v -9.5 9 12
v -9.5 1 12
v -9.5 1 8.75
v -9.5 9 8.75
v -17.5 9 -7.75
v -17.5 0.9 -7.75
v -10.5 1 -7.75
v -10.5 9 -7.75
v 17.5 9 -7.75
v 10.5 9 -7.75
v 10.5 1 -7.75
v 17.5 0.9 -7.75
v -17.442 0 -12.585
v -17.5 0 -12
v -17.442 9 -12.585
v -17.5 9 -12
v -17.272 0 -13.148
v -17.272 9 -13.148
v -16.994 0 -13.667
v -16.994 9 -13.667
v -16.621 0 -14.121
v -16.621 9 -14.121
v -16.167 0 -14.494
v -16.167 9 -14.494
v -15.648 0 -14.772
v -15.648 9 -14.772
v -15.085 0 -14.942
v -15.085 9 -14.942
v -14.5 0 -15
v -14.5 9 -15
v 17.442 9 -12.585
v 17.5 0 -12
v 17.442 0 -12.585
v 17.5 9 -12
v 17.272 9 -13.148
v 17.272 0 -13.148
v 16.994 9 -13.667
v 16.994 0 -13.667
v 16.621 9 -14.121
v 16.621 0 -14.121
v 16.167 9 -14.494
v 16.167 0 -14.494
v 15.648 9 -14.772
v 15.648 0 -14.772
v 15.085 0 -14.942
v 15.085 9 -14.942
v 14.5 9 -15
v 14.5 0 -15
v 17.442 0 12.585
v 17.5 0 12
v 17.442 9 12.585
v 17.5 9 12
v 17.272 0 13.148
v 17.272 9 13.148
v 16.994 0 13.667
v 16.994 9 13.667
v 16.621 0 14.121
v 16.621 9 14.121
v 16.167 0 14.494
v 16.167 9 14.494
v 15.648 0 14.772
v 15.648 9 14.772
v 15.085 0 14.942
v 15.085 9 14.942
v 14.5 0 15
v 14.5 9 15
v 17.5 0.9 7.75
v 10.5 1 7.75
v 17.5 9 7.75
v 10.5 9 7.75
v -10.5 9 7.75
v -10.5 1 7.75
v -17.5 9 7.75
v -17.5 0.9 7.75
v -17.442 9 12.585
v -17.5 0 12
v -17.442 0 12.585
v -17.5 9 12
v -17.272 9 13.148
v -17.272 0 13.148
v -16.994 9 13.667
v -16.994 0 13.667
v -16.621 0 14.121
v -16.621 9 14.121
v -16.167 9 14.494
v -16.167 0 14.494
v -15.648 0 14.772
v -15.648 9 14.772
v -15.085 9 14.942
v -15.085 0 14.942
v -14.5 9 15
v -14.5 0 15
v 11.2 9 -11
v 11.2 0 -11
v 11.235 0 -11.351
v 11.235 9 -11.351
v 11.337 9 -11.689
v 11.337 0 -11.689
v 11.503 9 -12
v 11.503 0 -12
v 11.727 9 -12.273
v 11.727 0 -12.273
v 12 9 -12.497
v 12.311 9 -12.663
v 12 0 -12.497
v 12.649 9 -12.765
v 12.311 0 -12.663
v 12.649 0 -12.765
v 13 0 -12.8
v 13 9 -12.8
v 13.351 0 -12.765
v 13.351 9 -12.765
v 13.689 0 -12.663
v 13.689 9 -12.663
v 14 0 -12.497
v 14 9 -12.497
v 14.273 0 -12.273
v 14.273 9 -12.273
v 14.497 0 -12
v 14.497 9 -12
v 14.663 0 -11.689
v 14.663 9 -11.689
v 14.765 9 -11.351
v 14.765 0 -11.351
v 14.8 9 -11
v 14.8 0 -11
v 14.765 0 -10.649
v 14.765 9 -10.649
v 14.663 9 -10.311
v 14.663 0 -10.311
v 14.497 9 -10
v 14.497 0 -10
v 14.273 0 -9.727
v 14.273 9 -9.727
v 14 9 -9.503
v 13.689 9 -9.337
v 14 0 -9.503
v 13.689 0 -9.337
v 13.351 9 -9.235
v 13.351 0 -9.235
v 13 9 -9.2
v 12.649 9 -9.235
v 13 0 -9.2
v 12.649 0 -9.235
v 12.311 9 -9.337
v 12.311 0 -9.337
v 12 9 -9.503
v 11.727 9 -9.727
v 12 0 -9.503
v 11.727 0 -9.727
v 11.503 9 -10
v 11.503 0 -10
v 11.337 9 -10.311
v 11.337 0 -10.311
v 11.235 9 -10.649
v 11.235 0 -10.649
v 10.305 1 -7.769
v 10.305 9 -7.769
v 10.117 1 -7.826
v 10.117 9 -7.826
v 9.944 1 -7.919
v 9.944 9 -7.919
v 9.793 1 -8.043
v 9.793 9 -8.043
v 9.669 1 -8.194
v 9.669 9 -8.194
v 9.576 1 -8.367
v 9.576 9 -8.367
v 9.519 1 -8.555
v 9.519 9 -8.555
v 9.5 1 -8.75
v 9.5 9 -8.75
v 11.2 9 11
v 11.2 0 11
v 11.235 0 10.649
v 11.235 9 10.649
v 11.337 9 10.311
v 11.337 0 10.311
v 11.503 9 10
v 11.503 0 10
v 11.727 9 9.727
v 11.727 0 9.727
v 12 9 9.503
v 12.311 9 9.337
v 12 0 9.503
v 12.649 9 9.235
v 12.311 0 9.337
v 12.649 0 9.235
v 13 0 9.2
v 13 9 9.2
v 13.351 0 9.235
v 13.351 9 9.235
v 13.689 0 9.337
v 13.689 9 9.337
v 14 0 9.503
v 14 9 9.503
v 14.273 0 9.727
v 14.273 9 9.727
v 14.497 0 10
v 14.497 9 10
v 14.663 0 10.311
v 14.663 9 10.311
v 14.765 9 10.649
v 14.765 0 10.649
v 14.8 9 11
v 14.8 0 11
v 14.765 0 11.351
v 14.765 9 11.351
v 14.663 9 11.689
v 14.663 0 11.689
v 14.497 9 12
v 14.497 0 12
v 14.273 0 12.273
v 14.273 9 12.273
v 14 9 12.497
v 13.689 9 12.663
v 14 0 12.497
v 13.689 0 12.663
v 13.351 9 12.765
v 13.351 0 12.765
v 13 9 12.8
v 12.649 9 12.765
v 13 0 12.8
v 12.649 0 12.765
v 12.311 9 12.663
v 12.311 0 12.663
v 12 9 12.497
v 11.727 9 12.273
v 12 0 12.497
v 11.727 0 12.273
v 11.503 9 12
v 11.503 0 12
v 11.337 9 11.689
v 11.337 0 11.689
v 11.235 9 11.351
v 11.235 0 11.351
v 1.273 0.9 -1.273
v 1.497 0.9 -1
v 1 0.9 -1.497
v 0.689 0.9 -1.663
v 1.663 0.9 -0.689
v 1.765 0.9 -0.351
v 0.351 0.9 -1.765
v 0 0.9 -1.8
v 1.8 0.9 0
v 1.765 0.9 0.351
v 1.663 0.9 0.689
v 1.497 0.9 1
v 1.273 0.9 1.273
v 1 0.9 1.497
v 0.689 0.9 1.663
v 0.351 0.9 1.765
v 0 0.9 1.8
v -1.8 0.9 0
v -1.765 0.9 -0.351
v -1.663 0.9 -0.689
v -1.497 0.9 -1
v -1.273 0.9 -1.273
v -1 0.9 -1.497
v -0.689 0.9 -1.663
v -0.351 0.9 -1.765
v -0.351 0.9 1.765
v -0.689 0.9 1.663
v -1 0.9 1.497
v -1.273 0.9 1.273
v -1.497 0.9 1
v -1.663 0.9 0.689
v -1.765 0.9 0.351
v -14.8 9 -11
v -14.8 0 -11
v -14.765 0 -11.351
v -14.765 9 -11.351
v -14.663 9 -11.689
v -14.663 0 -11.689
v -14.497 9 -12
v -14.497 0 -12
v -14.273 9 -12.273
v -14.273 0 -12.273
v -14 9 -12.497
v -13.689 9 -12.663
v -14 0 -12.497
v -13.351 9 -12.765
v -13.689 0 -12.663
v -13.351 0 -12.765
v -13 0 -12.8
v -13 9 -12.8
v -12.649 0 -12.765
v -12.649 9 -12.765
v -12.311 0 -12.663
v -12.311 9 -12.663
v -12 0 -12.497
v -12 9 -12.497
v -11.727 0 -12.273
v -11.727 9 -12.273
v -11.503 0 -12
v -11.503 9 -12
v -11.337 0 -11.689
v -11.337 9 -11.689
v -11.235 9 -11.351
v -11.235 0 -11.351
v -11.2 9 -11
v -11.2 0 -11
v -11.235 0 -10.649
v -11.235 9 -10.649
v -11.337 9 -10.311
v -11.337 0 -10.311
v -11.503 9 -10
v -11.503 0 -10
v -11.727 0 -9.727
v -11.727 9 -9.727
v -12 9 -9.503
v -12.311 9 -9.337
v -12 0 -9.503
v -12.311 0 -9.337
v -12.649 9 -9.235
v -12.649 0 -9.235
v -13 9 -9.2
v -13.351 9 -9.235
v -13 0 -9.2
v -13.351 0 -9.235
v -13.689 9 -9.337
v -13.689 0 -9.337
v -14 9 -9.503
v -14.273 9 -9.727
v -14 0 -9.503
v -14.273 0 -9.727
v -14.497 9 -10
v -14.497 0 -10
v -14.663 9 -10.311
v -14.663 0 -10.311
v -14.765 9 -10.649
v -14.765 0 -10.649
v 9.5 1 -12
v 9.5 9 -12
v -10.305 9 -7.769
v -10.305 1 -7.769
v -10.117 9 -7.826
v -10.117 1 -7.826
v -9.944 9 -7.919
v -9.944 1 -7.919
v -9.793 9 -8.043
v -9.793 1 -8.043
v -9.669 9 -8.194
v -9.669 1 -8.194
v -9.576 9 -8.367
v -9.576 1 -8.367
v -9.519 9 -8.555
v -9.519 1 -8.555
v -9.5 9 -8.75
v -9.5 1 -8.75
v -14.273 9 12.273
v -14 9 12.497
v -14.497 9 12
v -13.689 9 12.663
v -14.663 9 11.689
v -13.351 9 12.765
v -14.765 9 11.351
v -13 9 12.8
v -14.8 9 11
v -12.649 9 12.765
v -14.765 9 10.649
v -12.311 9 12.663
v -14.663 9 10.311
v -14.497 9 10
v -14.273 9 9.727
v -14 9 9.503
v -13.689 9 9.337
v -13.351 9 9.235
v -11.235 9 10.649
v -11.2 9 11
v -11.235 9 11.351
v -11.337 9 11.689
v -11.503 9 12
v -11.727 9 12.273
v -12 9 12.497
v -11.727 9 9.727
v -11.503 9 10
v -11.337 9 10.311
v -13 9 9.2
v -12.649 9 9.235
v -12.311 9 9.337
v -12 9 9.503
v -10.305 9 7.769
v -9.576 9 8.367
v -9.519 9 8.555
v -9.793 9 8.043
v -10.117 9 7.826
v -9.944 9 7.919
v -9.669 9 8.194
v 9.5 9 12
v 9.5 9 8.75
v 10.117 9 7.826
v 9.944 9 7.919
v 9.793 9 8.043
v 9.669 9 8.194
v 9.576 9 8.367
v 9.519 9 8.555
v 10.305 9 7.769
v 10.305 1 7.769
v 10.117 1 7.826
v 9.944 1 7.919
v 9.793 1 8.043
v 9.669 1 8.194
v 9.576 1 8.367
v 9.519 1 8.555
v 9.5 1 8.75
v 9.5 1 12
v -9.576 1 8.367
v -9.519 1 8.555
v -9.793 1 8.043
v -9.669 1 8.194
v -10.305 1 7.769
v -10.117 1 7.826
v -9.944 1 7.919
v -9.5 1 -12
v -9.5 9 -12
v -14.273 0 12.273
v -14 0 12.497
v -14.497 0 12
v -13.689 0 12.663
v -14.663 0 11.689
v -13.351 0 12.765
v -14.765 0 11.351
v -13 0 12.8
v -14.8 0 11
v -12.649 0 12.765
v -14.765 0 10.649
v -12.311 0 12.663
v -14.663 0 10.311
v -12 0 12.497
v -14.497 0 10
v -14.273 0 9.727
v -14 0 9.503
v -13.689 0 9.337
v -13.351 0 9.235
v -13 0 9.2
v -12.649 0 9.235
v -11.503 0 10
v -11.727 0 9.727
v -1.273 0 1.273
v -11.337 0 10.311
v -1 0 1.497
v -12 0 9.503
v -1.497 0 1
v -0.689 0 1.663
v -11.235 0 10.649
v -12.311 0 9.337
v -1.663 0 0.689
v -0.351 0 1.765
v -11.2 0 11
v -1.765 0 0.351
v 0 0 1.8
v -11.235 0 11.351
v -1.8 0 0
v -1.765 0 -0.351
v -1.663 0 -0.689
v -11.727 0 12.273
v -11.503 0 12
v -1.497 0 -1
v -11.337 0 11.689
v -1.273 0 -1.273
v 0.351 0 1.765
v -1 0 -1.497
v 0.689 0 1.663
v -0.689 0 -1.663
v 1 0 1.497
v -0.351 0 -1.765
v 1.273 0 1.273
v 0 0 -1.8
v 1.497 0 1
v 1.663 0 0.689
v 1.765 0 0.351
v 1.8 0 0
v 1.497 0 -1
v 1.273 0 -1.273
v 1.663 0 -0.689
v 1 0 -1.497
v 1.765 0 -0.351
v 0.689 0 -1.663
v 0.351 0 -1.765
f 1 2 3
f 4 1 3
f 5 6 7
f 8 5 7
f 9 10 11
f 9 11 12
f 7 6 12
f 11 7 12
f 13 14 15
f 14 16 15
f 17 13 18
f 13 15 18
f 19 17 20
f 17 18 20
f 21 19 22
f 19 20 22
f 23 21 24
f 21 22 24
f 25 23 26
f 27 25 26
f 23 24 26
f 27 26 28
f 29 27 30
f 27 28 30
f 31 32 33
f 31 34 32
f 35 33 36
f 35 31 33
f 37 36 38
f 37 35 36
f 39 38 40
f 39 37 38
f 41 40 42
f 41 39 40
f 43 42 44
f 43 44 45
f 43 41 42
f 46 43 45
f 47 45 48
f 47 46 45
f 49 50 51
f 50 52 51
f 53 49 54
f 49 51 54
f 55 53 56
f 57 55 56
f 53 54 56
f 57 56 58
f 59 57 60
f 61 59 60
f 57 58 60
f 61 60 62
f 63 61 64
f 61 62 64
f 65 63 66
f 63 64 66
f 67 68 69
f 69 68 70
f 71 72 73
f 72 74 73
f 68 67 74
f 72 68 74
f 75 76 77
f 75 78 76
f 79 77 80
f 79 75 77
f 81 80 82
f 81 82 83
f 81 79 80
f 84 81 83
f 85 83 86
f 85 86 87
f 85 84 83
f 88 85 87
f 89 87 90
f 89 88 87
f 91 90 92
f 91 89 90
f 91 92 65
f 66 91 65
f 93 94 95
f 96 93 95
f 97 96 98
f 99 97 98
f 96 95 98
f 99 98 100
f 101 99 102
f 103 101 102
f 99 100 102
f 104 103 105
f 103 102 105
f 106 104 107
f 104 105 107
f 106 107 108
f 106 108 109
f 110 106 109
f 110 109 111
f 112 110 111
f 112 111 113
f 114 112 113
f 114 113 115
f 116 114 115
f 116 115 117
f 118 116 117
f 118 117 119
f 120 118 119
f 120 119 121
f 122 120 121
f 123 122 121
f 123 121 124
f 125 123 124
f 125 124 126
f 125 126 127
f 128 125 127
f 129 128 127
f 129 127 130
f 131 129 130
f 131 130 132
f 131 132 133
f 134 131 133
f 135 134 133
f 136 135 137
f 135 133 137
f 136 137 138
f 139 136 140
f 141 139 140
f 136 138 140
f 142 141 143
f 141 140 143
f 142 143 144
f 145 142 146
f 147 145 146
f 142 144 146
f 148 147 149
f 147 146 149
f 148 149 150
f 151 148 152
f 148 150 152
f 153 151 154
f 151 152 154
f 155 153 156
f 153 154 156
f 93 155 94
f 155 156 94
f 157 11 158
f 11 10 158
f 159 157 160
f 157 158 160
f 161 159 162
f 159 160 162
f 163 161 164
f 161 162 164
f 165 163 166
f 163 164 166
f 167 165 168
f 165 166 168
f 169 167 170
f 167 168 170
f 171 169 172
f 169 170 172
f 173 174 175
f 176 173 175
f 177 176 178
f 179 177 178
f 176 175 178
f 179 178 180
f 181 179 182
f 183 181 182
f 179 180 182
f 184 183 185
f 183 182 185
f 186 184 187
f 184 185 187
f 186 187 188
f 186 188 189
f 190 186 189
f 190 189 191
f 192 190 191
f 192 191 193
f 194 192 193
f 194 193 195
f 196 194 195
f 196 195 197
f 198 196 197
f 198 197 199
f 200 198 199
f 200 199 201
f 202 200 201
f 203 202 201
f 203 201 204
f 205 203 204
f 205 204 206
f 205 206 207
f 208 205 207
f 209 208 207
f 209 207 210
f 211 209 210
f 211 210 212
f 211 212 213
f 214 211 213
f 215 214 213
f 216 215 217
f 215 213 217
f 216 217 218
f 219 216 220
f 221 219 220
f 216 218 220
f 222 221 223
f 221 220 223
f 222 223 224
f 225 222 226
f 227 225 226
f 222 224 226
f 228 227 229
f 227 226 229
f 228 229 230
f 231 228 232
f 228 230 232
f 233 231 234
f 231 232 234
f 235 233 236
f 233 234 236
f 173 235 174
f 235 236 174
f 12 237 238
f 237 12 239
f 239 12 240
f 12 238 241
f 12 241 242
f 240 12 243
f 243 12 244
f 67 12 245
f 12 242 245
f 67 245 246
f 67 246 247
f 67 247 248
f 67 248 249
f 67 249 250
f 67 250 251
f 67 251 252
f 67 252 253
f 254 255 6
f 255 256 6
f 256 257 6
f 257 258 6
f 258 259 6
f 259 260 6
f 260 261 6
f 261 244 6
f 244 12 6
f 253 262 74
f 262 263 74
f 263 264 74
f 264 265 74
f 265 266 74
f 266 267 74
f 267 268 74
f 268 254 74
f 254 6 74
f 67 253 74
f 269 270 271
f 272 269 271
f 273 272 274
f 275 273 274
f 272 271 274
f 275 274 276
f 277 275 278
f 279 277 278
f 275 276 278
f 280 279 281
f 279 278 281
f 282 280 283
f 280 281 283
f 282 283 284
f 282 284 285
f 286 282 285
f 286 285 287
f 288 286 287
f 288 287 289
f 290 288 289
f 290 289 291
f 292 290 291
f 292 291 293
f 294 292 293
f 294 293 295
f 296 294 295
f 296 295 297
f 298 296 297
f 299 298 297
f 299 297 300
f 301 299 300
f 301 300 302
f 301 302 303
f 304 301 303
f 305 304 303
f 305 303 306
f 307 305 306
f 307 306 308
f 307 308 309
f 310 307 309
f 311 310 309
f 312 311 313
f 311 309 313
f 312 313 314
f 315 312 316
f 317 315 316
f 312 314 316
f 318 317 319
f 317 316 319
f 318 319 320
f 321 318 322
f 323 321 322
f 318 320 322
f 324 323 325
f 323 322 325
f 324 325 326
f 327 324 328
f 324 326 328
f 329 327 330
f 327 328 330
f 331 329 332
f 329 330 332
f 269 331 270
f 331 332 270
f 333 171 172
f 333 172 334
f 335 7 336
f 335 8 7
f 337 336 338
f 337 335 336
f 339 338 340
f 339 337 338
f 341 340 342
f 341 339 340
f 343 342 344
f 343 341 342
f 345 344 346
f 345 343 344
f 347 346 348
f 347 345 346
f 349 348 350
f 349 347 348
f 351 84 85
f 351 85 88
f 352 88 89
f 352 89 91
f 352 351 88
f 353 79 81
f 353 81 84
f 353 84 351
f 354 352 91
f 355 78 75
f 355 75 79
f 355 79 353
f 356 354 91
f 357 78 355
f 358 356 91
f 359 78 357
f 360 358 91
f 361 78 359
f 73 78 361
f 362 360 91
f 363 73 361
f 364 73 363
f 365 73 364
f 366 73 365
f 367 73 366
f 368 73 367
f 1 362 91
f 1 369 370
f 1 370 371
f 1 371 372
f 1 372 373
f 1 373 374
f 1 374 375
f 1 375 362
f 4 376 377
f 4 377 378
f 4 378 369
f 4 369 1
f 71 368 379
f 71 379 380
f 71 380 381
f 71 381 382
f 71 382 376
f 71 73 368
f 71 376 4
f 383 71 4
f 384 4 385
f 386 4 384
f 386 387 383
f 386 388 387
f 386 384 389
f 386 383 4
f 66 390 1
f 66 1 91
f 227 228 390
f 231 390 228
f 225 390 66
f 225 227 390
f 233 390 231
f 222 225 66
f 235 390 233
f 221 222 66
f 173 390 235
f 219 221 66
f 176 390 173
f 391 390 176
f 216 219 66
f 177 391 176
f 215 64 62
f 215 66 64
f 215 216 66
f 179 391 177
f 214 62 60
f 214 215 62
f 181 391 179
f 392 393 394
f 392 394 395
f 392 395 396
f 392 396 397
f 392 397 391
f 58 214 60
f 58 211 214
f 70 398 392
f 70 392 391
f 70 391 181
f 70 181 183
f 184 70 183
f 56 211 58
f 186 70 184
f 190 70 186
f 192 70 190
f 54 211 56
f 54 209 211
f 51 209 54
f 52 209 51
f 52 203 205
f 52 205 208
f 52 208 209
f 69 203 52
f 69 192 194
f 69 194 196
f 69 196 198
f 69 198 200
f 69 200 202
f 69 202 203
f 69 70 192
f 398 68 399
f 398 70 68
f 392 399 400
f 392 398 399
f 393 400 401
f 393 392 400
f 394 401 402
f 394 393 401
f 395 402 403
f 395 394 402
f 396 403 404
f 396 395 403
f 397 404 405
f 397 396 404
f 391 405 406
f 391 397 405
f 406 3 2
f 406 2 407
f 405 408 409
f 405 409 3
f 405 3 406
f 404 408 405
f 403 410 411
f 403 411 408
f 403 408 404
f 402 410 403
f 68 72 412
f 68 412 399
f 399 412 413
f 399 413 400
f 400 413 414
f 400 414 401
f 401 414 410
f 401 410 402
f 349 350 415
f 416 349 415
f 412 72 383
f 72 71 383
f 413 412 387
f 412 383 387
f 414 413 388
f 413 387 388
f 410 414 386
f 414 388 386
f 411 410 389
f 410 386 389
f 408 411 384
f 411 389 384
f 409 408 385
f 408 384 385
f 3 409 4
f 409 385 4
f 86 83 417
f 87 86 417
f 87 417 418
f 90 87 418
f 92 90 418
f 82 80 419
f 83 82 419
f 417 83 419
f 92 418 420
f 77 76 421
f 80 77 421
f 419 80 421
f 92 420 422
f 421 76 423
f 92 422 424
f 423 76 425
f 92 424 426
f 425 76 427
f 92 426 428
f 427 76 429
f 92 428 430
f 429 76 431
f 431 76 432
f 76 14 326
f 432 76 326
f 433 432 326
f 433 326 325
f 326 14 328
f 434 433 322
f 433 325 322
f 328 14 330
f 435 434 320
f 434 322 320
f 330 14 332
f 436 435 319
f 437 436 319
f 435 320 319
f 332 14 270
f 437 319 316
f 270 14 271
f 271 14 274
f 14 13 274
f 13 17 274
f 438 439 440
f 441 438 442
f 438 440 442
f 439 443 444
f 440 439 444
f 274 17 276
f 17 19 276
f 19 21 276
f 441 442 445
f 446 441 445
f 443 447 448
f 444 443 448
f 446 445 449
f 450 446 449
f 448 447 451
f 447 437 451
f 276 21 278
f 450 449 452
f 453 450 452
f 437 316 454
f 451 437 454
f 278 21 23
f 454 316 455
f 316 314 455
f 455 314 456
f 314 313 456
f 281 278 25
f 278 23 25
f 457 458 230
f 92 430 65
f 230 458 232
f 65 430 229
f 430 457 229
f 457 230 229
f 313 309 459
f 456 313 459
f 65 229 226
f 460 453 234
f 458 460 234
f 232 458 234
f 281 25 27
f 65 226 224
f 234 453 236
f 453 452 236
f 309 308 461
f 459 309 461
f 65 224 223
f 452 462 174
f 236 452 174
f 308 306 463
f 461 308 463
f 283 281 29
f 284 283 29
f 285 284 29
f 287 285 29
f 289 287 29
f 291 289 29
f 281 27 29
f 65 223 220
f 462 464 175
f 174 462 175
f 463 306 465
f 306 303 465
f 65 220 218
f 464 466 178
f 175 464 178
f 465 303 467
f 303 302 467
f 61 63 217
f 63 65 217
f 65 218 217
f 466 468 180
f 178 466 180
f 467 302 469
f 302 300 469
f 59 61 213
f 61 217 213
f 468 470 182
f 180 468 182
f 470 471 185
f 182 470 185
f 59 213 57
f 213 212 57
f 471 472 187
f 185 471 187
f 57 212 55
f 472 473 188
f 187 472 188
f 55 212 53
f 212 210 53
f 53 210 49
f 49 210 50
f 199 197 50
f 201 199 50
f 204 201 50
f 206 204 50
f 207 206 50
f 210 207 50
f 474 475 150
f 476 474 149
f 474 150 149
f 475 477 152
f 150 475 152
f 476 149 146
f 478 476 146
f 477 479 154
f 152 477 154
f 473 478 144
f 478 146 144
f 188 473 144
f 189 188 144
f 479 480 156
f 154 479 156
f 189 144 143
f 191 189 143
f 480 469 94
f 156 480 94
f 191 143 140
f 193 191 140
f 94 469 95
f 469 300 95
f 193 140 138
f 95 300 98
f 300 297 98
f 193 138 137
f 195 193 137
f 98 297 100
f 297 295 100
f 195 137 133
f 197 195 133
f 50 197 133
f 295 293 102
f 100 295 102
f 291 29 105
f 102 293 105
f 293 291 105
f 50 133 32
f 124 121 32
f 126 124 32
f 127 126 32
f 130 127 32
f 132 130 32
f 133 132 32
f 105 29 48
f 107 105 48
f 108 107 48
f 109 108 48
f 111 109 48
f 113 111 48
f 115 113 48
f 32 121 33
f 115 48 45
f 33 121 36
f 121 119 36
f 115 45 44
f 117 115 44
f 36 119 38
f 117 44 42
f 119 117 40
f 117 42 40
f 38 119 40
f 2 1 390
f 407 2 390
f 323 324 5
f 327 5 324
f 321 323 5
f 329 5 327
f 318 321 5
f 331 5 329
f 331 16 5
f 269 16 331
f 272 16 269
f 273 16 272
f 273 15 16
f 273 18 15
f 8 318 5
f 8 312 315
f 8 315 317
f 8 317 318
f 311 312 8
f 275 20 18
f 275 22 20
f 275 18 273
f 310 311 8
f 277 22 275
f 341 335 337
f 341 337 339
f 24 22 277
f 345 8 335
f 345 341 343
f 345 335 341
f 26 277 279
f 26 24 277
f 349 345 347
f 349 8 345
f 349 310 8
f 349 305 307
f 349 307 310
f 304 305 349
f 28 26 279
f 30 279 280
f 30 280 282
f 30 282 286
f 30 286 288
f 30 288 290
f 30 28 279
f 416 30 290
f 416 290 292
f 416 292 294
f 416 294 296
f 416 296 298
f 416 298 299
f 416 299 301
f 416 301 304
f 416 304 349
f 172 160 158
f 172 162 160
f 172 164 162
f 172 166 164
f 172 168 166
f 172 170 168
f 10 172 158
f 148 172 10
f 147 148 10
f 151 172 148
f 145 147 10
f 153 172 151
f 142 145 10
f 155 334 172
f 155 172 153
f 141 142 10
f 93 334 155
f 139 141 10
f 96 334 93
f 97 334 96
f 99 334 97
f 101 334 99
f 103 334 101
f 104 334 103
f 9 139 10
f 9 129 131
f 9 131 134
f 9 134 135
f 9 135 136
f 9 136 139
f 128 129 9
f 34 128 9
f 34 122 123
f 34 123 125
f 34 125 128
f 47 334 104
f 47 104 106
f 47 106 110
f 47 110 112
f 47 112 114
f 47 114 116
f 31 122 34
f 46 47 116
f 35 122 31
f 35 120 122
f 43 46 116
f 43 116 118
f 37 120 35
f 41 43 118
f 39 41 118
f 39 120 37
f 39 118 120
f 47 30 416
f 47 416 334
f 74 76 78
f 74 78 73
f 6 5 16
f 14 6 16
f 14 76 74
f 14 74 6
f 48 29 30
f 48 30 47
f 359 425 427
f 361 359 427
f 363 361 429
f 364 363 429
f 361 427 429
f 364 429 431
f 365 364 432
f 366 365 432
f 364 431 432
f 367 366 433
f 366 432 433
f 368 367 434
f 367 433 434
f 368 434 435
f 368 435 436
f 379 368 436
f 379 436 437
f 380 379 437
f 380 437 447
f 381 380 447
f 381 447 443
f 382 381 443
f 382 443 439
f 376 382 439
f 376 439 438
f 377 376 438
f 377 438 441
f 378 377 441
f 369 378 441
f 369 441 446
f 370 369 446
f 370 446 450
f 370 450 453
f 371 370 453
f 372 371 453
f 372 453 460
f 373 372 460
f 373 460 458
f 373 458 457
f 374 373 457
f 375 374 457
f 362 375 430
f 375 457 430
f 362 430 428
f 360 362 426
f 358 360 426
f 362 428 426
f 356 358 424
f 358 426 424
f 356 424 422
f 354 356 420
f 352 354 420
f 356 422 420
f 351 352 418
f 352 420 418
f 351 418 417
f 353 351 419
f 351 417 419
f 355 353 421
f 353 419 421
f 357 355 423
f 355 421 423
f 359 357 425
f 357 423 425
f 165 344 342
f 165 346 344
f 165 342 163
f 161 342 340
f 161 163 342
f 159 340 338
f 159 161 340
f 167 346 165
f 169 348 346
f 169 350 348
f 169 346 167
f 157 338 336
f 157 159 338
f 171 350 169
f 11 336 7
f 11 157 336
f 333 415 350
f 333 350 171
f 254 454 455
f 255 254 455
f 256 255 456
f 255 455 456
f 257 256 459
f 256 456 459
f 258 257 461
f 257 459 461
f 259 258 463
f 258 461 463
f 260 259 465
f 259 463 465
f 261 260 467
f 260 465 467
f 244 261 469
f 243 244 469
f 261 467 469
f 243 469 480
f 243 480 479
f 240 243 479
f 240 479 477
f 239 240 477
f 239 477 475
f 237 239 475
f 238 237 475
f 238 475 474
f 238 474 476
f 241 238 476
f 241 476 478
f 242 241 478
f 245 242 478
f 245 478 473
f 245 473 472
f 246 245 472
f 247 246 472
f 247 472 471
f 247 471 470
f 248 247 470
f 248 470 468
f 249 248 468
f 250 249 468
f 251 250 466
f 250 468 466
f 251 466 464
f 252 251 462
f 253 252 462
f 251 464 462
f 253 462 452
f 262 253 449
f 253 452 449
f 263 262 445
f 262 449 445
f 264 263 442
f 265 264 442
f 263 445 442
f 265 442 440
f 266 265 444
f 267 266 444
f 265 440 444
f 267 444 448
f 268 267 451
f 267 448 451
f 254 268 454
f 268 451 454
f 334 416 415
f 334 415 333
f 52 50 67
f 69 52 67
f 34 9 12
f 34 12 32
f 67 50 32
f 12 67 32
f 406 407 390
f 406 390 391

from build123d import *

# Parameters (mm, degrees)
SKETCH1_W            = 35
SKETCH1_H            = 30
BOSS_EXTRUDE1_DEPTH  = 9
SKETCH3_W            = 29
SKETCH3_H            = 24
CUT_EXTRUDE1_DEPTH   = 8
SKETCH4_W            = 15.5
SKETCH4_H            = 8.1
CUT_EXTRUDE2_DEPTH   = 36
SKETCH5_W            = 5
SKETCH5_H            = 4.25
BOSS_EXTRUDE2_DEPTH  = 8
M3_CLEARANCE_HOLE1_D = 3.6
FILLET1_R            = 3
FILLET2_R            = 1


with BuildPart() as part:
    # Sketch1 → Boss-Extrude1 (new body)
    with BuildSketch(Plane(origin=(0, 0, 0), x_dir=(1, 0, 0), z_dir=(0, 1, 0))):
        Rectangle(SKETCH1_W, SKETCH1_H)
    extrude(amount=BOSS_EXTRUDE1_DEPTH)

    # Sketch3 → Cut-Extrude1 (cut)
    with BuildSketch(Plane(origin=(0, 9, 0), x_dir=(1, 0, 0), z_dir=(0, 1, 0))):
        Rectangle(SKETCH3_W, SKETCH3_H)
    extrude(amount=-CUT_EXTRUDE1_DEPTH, mode=Mode.SUBTRACT)

    # Sketch4 → Cut-Extrude2 (cut, through all)
    with BuildSketch(Plane.ZY.offset(17.5)):
        with Locations((0, 4.95)):
            Rectangle(SKETCH4_W, SKETCH4_H)
    extrude(amount=-CUT_EXTRUDE2_DEPTH, mode=Mode.SUBTRACT)

    # Sketch5 → Boss-Extrude2 (add)
    with BuildSketch(Plane(origin=(0, 1, 0), x_dir=(1, 0, 0), z_dir=(0, 1, 0))):
        with Locations((-12, 9.875)):
            Rectangle(SKETCH5_W, SKETCH5_H)
        with Locations((12, 9.875)):
            Rectangle(SKETCH5_W, SKETCH5_H)
        with Locations((12, -9.875)):
            Rectangle(SKETCH5_W, SKETCH5_H)
        with Locations((-12, -9.875)):
            Rectangle(SKETCH5_W, SKETCH5_H)
    extrude(amount=BOSS_EXTRUDE2_DEPTH)

    # M3 Clearance Hole1 (through all)
    with Locations(Plane(origin=(0, 9, 0), x_dir=(1, 0, 0), z_dir=(0, 1, 0))):
        with Locations((0, 0), (13, 11), (-13, -11), (-13, 11), (13, -11)):
            Hole(M3_CLEARANCE_HOLE1_D / 2)

    # Fillet1
    fillet1_edges = [part.edges().sort_by_distance(p)[0] for p in [
        (17.5, 4.5, 15),
        (-17.5, 4.5, 15),
        (-17.5, 4.5, -15),
        (17.5, 4.5, -15),
    ]]
    fillet(fillet1_edges, radius=FILLET1_R)

    # Fillet2
    fillet2_edges = [part.edges().sort_by_distance(p)[0] for p in [
        (-9.5, 5, -7.75),
        (9.5, 5, -7.75),
        (9.5, 5, 7.75),
        (-9.5, 5, 7.75),
    ]]
    fillet(fillet2_edges, radius=FILLET2_R)


solid = part.part
